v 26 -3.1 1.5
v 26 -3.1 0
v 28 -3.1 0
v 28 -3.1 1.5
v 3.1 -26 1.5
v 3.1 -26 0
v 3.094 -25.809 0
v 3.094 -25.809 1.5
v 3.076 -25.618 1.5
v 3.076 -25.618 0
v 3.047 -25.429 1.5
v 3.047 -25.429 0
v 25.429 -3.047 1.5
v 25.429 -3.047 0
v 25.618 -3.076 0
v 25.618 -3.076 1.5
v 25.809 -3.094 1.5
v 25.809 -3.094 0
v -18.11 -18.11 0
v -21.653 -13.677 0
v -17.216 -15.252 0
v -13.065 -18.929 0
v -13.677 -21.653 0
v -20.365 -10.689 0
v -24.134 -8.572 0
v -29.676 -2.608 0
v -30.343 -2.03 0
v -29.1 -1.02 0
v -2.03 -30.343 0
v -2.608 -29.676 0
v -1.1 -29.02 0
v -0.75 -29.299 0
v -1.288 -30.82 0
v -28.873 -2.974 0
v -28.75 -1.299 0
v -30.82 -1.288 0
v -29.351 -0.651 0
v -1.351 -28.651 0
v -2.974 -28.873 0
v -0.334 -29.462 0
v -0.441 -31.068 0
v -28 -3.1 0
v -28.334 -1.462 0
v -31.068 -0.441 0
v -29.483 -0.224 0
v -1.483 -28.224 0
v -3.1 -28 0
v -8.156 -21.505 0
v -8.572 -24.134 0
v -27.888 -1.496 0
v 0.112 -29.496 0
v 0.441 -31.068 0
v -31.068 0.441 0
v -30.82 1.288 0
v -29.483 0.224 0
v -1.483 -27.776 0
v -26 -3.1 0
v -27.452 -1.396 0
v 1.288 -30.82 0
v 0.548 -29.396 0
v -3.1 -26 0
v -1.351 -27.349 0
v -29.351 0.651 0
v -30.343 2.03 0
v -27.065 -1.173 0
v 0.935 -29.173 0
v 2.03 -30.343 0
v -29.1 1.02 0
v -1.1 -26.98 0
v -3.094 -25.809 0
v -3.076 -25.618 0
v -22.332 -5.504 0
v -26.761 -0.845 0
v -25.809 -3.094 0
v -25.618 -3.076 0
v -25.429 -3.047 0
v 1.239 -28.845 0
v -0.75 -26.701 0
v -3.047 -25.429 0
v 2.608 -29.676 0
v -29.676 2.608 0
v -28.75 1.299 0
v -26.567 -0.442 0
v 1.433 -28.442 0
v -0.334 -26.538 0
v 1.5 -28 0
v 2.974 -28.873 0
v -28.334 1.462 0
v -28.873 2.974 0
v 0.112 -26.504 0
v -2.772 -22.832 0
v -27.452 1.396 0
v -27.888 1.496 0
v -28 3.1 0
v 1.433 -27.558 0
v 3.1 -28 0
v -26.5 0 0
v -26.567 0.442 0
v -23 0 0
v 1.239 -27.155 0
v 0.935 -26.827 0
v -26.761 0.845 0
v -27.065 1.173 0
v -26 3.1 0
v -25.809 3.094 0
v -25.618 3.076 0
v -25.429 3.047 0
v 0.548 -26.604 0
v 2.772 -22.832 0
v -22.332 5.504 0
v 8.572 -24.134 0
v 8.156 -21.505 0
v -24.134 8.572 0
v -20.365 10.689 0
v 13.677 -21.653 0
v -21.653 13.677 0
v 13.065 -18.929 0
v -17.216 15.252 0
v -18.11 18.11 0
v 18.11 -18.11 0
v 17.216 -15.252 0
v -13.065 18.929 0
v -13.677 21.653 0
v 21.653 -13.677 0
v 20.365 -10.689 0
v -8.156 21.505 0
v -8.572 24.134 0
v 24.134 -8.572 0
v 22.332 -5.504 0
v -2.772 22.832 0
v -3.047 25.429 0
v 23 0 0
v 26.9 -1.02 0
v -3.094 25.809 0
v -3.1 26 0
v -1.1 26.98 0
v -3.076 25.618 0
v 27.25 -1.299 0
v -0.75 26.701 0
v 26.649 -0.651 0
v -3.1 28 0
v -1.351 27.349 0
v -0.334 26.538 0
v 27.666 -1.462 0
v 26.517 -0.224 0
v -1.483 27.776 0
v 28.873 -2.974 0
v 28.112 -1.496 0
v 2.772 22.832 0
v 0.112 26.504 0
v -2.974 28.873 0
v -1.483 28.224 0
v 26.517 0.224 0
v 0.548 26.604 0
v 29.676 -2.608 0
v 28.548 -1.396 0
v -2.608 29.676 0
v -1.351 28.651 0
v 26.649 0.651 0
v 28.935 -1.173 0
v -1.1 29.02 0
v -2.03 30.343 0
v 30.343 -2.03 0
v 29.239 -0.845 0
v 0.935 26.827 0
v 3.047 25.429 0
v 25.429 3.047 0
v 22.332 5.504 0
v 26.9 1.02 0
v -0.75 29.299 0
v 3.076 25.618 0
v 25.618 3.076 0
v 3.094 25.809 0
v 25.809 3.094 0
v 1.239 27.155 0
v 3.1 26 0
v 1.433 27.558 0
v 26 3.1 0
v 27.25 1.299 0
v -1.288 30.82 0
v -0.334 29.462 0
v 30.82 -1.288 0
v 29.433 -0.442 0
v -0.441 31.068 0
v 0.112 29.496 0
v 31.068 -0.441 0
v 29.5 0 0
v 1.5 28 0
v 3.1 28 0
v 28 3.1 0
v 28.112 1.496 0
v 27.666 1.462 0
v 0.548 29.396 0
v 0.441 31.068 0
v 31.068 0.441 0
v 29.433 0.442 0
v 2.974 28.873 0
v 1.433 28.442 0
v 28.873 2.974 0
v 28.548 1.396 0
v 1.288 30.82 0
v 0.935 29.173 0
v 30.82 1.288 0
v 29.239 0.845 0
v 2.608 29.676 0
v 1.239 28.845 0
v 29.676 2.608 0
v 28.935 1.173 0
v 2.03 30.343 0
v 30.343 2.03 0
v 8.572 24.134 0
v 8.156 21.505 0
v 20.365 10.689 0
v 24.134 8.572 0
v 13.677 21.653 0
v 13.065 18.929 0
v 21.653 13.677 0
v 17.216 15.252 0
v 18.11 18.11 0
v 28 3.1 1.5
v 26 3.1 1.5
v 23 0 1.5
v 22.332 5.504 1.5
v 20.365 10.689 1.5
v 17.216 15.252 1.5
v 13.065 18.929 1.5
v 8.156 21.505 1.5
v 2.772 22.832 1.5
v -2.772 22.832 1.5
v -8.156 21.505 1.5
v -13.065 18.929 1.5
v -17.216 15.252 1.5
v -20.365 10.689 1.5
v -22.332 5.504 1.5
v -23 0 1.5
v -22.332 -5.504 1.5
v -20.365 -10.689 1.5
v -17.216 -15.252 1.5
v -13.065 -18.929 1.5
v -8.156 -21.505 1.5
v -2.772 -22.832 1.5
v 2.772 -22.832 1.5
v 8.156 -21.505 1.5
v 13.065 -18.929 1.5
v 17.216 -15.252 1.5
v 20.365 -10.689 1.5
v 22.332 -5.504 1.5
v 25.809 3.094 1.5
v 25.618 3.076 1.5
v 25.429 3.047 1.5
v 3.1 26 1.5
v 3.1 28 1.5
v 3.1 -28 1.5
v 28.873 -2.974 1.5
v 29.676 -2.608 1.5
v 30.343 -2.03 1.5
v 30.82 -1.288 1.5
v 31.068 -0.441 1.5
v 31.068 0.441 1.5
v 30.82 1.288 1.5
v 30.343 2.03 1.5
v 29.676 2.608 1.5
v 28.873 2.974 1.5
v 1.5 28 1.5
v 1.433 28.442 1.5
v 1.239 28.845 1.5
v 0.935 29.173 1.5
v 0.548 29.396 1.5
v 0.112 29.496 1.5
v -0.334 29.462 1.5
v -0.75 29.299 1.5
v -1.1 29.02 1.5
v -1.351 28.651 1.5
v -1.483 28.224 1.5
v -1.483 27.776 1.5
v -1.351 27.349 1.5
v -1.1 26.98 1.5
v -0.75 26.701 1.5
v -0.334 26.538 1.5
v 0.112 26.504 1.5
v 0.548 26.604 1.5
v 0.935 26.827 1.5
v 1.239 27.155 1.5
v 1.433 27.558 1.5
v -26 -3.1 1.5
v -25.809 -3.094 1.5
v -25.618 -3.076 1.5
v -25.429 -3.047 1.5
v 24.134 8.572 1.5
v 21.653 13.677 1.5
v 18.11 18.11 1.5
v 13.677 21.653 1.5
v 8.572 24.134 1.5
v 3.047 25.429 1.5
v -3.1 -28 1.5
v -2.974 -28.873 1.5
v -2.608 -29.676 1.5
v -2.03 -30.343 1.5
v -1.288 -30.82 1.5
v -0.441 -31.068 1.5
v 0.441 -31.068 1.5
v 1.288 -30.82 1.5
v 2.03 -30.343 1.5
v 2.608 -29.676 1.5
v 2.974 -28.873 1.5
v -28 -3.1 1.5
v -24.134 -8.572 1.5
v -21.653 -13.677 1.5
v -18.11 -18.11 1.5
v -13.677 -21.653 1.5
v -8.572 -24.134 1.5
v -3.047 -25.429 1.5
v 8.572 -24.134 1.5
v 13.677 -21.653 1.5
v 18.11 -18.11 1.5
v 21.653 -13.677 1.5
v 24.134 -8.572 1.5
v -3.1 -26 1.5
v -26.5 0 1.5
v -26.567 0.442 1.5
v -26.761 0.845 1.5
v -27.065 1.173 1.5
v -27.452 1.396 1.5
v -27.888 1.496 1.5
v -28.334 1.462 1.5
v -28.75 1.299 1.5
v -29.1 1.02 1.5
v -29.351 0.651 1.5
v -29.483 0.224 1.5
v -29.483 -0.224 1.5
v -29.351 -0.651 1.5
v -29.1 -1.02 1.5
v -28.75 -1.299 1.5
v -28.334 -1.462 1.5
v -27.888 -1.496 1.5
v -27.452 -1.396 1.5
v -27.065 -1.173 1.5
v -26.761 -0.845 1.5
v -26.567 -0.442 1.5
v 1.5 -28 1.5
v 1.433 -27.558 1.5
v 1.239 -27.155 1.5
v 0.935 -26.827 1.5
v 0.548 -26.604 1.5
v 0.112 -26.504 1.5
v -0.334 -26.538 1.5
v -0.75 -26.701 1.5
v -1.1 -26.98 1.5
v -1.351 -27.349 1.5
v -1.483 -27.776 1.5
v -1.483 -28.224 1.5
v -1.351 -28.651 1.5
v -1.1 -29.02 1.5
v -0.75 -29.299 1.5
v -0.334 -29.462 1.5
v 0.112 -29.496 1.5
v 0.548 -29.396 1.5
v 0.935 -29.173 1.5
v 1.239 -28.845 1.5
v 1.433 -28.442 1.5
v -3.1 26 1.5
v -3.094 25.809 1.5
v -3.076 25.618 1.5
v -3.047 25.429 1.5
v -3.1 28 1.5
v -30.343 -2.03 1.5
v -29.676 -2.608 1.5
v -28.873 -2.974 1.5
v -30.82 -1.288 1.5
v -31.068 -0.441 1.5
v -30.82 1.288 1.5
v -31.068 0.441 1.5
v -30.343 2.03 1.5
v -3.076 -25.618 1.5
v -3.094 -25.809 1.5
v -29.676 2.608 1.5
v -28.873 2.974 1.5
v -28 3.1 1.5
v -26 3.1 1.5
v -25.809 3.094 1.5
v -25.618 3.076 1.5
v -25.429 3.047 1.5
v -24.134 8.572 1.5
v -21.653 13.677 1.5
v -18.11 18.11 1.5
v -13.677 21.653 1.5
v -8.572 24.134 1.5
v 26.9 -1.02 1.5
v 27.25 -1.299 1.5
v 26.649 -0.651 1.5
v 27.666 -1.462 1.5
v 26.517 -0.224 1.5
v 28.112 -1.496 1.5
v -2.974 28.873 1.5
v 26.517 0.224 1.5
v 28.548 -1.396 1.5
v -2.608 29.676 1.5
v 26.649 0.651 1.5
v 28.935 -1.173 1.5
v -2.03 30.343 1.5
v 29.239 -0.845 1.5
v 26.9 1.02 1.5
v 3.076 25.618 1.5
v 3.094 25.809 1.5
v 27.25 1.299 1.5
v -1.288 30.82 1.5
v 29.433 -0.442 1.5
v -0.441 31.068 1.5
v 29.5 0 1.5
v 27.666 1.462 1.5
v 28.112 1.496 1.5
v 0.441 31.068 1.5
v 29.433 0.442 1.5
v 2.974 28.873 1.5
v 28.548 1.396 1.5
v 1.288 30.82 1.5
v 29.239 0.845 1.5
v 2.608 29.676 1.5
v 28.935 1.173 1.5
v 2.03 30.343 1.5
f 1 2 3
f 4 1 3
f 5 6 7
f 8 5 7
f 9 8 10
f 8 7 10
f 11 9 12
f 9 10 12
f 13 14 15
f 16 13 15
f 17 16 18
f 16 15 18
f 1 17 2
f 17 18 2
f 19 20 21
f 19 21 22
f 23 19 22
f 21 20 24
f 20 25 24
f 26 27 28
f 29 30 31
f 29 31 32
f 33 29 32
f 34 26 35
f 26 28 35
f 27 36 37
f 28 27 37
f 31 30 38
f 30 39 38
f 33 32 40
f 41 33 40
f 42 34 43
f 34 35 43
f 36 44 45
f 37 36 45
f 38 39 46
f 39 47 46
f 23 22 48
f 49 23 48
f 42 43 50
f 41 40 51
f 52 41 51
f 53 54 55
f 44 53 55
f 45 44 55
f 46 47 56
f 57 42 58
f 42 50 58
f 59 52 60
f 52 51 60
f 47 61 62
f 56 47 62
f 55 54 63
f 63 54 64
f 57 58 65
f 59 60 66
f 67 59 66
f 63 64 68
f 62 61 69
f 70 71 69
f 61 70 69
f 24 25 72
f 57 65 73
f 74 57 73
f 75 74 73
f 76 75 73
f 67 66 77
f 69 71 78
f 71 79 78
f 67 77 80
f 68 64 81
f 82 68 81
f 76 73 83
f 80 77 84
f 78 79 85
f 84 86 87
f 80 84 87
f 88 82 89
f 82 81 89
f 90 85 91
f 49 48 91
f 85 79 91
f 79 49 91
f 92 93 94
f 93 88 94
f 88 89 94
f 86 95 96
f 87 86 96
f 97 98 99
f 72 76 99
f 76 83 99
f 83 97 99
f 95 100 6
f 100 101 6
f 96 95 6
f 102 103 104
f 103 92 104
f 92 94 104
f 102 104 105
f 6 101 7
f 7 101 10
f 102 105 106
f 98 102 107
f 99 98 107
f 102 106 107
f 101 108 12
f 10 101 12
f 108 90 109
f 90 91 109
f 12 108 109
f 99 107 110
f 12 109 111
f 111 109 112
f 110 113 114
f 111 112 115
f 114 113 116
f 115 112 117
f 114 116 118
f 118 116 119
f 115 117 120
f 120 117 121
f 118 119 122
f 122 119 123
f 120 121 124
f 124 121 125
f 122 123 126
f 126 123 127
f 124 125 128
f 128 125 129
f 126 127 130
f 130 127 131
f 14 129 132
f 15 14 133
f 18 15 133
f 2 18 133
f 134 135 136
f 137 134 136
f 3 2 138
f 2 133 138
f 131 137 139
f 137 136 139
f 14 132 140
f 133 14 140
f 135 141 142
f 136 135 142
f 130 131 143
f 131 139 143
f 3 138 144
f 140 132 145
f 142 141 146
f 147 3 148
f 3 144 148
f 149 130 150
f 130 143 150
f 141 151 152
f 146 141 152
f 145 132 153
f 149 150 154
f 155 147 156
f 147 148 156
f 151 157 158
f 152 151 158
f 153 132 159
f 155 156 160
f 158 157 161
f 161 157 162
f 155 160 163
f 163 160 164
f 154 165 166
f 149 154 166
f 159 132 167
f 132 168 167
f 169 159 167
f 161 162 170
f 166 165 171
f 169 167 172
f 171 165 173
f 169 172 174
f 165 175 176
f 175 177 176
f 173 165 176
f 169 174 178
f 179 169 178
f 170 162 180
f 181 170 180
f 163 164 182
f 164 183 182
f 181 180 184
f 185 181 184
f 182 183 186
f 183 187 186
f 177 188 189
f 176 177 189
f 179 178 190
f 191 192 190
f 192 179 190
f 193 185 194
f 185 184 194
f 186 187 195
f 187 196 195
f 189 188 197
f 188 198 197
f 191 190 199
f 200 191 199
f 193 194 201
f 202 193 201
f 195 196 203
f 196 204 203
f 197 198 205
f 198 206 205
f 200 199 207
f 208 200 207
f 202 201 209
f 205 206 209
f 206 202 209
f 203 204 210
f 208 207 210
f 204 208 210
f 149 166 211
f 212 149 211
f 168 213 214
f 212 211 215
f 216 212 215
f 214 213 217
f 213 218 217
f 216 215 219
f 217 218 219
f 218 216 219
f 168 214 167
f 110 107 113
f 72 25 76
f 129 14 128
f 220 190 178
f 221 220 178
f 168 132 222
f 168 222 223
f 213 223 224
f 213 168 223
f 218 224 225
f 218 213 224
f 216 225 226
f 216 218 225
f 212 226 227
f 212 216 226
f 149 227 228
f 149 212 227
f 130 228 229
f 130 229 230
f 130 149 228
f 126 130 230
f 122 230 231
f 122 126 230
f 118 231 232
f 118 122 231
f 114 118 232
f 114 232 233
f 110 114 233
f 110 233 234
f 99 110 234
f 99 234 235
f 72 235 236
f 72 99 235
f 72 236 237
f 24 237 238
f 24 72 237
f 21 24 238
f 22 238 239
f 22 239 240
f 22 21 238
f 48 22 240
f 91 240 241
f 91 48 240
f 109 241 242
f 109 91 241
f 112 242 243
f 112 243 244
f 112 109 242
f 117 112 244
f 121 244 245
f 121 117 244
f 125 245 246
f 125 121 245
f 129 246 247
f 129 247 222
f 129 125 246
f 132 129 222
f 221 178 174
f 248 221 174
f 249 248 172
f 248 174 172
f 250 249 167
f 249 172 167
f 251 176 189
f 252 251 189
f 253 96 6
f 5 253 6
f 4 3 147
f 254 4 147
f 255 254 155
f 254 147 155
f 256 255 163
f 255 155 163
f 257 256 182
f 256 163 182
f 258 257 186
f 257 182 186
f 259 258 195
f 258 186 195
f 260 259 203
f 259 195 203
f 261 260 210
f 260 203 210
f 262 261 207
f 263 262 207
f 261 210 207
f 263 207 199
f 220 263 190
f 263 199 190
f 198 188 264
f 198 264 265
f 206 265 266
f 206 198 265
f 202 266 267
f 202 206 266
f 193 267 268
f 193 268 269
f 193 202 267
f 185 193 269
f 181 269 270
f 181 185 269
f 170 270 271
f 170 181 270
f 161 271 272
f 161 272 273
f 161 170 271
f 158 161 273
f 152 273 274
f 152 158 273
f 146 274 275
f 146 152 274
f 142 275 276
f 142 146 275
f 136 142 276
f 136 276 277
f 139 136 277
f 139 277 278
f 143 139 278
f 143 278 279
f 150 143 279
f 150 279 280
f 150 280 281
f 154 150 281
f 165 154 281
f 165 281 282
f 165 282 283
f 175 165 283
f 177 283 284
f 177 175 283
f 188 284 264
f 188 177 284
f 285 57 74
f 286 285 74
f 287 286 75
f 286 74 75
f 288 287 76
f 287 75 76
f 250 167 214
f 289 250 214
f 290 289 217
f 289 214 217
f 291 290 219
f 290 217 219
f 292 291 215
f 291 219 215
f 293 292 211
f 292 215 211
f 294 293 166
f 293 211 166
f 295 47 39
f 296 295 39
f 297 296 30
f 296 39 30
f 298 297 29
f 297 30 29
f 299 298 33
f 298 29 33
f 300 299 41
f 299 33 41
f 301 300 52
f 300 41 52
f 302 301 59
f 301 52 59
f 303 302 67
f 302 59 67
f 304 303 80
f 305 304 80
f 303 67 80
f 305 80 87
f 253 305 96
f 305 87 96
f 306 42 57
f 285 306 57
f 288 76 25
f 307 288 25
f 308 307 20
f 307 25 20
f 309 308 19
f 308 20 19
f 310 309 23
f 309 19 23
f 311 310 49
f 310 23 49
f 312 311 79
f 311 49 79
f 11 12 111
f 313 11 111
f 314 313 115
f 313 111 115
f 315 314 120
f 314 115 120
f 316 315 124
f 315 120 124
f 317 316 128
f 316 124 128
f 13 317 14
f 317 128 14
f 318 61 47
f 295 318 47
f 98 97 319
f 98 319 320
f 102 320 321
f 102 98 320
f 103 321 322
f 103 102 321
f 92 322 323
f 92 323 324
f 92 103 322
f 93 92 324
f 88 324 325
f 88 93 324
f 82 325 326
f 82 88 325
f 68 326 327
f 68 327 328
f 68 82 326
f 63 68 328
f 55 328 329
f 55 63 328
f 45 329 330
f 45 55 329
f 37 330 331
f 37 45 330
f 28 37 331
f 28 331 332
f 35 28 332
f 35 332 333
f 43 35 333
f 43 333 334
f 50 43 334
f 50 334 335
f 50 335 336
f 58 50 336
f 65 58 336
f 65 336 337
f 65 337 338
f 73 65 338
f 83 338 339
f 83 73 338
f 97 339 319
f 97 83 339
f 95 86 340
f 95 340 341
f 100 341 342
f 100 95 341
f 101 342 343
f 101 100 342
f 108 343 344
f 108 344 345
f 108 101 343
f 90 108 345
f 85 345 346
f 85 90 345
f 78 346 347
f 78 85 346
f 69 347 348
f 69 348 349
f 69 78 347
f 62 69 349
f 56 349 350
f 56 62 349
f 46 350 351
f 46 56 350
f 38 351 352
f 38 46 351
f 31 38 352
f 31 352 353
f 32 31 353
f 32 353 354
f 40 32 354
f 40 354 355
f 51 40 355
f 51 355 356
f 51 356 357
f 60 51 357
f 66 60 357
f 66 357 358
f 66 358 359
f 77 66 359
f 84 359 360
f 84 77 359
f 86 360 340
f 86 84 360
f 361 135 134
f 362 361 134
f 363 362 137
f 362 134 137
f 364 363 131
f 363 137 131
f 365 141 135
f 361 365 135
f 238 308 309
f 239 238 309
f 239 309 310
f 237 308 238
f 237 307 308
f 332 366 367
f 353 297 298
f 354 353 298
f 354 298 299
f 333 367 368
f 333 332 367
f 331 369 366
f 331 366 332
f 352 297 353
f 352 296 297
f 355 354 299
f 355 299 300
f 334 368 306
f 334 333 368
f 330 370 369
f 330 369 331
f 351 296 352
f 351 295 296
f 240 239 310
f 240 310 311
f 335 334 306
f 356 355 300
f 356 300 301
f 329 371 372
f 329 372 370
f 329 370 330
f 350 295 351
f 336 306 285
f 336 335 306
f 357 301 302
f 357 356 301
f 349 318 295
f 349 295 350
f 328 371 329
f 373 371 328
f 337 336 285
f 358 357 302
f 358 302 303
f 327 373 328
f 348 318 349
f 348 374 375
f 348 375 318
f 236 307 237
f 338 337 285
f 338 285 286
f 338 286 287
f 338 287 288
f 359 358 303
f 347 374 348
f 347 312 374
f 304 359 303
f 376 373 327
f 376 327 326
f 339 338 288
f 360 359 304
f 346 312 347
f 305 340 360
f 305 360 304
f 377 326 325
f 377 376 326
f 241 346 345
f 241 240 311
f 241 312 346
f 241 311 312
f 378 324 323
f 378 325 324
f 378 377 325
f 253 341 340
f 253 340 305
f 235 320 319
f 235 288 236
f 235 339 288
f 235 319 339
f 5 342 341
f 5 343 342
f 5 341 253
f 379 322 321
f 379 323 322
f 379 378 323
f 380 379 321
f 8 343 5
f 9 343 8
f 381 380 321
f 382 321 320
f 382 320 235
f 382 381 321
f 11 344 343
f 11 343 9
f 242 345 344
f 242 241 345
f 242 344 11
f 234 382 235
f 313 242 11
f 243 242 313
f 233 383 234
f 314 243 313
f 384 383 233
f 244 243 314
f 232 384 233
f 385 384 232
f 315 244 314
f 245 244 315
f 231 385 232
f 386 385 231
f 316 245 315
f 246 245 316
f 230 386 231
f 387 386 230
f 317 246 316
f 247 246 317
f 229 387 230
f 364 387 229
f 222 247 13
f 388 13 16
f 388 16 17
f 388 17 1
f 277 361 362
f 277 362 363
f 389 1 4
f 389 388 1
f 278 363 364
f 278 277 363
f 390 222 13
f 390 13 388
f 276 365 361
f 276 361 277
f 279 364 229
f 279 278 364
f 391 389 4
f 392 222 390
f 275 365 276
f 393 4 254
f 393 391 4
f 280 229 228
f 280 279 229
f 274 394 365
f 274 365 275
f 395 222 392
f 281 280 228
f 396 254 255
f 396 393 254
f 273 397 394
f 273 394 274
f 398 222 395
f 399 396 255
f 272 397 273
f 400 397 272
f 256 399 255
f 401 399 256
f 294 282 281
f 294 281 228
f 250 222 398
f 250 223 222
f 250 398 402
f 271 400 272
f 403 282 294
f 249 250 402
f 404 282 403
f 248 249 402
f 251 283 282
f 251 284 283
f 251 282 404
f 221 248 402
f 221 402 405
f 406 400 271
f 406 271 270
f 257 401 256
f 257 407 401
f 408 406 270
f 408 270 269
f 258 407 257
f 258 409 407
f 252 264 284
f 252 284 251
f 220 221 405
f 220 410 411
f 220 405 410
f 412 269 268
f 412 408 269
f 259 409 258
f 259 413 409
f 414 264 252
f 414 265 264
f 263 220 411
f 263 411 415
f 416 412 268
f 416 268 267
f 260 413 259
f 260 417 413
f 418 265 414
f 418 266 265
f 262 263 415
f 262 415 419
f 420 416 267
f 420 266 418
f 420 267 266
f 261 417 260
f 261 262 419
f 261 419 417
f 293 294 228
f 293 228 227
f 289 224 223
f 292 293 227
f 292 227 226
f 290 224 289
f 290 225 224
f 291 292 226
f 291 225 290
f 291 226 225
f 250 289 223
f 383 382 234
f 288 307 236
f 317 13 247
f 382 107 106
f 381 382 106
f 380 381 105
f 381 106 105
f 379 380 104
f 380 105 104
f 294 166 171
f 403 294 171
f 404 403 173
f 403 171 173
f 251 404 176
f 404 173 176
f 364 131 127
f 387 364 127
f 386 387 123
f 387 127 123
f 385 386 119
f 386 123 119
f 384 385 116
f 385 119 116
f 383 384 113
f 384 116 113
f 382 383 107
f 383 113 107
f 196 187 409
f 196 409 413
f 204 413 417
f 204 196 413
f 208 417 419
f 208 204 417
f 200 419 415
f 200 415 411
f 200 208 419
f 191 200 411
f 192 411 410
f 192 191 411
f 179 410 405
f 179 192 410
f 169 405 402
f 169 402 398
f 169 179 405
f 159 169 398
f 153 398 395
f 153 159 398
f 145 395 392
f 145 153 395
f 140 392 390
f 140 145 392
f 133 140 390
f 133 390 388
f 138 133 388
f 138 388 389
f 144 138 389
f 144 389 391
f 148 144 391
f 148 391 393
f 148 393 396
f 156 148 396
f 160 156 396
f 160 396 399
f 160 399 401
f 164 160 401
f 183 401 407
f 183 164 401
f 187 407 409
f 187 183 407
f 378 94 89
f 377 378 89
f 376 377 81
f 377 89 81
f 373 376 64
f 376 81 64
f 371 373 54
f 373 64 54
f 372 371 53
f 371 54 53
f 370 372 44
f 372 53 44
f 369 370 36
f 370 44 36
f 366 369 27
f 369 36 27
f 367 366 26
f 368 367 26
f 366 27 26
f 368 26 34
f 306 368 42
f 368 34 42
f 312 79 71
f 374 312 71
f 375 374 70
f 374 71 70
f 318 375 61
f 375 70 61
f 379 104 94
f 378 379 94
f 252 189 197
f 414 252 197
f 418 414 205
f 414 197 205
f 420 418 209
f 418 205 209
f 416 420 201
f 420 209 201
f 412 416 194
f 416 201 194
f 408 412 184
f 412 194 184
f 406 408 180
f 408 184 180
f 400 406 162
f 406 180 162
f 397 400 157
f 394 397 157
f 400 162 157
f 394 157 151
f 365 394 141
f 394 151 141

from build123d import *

# Parameters (mm, degrees)
SKETCH2_R           = 23
SKETCH2_R_2         = 1.5
BOSS_EXTRUDE1_DEPTH = 1.5


with BuildPart() as part:
    # Sketch2 → Boss-Extrude1 (new body)
    with BuildSketch(Plane.XY):
        with BuildLine():
            Line((26, -3.1), (28, -3.1))
            ThreePointArc((28, -3.1), (31.1, 0), (28, 3.1))
            Line((28, 3.1), (26, 3.1))
            ThreePointArc((26, 3.1), (25.713286425, 3.086712705), (25.429030688, 3.046964726))
            ThreePointArc((25.429030688, 3.046964726), (18.109660347, 18.109660347), (3.046964726, 25.429030688))
            ThreePointArc((3.046964726, 25.429030688), (3.086712705, 25.713286425), (3.1, 26))
            Line((3.1, 26), (3.1, 28))
            ThreePointArc((3.1, 28), (0, 31.1), (-3.1, 28))
            Line((-3.1, 28), (-3.1, 26))
            ThreePointArc((-3.1, 26), (-3.086712705, 25.713286425), (-3.046964726, 25.429030688))
            ThreePointArc((-3.046964726, 25.429030688), (-18.109660347, 18.109660347), (-25.429030688, 3.046964726))
            ThreePointArc((-25.429030688, 3.046964726), (-25.713286425, 3.086712705), (-26, 3.1))
            Line((-26, 3.1), (-28, 3.1))
            ThreePointArc((-28, 3.1), (-31.1, 0), (-28, -3.1))
            Line((-28, -3.1), (-26, -3.1))
            ThreePointArc((-26, -3.1), (-25.713286425, -3.086712705), (-25.429030688, -3.046964726))
            ThreePointArc((-25.429030688, -3.046964726), (-18.109660347, -18.109660347), (-3.046964726, -25.429030688))
            ThreePointArc((-3.046964726, -25.429030688), (-3.086712705, -25.713286425), (-3.1, -26))
            Line((-3.1, -26), (-3.1, -28))
            ThreePointArc((-3.1, -28), (0, -31.1), (3.1, -28))
            Line((3.1, -28), (3.1, -26))
            ThreePointArc((3.1, -26), (3.086712705, -25.713286425), (3.046964726, -25.429030688))
            ThreePointArc((3.046964726, -25.429030688), (18.109660347, -18.109660347), (25.429030688, -3.046964726))
            ThreePointArc((25.429030688, -3.046964726), (25.713286425, -3.086712705), (26, -3.1))
        make_face()
        Circle(SKETCH2_R, mode=Mode.SUBTRACT)
        with Locations((-28, 0)):
            Circle(SKETCH2_R_2, mode=Mode.SUBTRACT)
        with Locations((0, 28)):
            Circle(SKETCH2_R_2, mode=Mode.SUBTRACT)
        with Locations((28, 0)):
            Circle(SKETCH2_R_2, mode=Mode.SUBTRACT)
        with Locations((0, -28)):
            Circle(SKETCH2_R_2, mode=Mode.SUBTRACT)
    extrude(amount=BOSS_EXTRUDE1_DEPTH)


solid = part.part
